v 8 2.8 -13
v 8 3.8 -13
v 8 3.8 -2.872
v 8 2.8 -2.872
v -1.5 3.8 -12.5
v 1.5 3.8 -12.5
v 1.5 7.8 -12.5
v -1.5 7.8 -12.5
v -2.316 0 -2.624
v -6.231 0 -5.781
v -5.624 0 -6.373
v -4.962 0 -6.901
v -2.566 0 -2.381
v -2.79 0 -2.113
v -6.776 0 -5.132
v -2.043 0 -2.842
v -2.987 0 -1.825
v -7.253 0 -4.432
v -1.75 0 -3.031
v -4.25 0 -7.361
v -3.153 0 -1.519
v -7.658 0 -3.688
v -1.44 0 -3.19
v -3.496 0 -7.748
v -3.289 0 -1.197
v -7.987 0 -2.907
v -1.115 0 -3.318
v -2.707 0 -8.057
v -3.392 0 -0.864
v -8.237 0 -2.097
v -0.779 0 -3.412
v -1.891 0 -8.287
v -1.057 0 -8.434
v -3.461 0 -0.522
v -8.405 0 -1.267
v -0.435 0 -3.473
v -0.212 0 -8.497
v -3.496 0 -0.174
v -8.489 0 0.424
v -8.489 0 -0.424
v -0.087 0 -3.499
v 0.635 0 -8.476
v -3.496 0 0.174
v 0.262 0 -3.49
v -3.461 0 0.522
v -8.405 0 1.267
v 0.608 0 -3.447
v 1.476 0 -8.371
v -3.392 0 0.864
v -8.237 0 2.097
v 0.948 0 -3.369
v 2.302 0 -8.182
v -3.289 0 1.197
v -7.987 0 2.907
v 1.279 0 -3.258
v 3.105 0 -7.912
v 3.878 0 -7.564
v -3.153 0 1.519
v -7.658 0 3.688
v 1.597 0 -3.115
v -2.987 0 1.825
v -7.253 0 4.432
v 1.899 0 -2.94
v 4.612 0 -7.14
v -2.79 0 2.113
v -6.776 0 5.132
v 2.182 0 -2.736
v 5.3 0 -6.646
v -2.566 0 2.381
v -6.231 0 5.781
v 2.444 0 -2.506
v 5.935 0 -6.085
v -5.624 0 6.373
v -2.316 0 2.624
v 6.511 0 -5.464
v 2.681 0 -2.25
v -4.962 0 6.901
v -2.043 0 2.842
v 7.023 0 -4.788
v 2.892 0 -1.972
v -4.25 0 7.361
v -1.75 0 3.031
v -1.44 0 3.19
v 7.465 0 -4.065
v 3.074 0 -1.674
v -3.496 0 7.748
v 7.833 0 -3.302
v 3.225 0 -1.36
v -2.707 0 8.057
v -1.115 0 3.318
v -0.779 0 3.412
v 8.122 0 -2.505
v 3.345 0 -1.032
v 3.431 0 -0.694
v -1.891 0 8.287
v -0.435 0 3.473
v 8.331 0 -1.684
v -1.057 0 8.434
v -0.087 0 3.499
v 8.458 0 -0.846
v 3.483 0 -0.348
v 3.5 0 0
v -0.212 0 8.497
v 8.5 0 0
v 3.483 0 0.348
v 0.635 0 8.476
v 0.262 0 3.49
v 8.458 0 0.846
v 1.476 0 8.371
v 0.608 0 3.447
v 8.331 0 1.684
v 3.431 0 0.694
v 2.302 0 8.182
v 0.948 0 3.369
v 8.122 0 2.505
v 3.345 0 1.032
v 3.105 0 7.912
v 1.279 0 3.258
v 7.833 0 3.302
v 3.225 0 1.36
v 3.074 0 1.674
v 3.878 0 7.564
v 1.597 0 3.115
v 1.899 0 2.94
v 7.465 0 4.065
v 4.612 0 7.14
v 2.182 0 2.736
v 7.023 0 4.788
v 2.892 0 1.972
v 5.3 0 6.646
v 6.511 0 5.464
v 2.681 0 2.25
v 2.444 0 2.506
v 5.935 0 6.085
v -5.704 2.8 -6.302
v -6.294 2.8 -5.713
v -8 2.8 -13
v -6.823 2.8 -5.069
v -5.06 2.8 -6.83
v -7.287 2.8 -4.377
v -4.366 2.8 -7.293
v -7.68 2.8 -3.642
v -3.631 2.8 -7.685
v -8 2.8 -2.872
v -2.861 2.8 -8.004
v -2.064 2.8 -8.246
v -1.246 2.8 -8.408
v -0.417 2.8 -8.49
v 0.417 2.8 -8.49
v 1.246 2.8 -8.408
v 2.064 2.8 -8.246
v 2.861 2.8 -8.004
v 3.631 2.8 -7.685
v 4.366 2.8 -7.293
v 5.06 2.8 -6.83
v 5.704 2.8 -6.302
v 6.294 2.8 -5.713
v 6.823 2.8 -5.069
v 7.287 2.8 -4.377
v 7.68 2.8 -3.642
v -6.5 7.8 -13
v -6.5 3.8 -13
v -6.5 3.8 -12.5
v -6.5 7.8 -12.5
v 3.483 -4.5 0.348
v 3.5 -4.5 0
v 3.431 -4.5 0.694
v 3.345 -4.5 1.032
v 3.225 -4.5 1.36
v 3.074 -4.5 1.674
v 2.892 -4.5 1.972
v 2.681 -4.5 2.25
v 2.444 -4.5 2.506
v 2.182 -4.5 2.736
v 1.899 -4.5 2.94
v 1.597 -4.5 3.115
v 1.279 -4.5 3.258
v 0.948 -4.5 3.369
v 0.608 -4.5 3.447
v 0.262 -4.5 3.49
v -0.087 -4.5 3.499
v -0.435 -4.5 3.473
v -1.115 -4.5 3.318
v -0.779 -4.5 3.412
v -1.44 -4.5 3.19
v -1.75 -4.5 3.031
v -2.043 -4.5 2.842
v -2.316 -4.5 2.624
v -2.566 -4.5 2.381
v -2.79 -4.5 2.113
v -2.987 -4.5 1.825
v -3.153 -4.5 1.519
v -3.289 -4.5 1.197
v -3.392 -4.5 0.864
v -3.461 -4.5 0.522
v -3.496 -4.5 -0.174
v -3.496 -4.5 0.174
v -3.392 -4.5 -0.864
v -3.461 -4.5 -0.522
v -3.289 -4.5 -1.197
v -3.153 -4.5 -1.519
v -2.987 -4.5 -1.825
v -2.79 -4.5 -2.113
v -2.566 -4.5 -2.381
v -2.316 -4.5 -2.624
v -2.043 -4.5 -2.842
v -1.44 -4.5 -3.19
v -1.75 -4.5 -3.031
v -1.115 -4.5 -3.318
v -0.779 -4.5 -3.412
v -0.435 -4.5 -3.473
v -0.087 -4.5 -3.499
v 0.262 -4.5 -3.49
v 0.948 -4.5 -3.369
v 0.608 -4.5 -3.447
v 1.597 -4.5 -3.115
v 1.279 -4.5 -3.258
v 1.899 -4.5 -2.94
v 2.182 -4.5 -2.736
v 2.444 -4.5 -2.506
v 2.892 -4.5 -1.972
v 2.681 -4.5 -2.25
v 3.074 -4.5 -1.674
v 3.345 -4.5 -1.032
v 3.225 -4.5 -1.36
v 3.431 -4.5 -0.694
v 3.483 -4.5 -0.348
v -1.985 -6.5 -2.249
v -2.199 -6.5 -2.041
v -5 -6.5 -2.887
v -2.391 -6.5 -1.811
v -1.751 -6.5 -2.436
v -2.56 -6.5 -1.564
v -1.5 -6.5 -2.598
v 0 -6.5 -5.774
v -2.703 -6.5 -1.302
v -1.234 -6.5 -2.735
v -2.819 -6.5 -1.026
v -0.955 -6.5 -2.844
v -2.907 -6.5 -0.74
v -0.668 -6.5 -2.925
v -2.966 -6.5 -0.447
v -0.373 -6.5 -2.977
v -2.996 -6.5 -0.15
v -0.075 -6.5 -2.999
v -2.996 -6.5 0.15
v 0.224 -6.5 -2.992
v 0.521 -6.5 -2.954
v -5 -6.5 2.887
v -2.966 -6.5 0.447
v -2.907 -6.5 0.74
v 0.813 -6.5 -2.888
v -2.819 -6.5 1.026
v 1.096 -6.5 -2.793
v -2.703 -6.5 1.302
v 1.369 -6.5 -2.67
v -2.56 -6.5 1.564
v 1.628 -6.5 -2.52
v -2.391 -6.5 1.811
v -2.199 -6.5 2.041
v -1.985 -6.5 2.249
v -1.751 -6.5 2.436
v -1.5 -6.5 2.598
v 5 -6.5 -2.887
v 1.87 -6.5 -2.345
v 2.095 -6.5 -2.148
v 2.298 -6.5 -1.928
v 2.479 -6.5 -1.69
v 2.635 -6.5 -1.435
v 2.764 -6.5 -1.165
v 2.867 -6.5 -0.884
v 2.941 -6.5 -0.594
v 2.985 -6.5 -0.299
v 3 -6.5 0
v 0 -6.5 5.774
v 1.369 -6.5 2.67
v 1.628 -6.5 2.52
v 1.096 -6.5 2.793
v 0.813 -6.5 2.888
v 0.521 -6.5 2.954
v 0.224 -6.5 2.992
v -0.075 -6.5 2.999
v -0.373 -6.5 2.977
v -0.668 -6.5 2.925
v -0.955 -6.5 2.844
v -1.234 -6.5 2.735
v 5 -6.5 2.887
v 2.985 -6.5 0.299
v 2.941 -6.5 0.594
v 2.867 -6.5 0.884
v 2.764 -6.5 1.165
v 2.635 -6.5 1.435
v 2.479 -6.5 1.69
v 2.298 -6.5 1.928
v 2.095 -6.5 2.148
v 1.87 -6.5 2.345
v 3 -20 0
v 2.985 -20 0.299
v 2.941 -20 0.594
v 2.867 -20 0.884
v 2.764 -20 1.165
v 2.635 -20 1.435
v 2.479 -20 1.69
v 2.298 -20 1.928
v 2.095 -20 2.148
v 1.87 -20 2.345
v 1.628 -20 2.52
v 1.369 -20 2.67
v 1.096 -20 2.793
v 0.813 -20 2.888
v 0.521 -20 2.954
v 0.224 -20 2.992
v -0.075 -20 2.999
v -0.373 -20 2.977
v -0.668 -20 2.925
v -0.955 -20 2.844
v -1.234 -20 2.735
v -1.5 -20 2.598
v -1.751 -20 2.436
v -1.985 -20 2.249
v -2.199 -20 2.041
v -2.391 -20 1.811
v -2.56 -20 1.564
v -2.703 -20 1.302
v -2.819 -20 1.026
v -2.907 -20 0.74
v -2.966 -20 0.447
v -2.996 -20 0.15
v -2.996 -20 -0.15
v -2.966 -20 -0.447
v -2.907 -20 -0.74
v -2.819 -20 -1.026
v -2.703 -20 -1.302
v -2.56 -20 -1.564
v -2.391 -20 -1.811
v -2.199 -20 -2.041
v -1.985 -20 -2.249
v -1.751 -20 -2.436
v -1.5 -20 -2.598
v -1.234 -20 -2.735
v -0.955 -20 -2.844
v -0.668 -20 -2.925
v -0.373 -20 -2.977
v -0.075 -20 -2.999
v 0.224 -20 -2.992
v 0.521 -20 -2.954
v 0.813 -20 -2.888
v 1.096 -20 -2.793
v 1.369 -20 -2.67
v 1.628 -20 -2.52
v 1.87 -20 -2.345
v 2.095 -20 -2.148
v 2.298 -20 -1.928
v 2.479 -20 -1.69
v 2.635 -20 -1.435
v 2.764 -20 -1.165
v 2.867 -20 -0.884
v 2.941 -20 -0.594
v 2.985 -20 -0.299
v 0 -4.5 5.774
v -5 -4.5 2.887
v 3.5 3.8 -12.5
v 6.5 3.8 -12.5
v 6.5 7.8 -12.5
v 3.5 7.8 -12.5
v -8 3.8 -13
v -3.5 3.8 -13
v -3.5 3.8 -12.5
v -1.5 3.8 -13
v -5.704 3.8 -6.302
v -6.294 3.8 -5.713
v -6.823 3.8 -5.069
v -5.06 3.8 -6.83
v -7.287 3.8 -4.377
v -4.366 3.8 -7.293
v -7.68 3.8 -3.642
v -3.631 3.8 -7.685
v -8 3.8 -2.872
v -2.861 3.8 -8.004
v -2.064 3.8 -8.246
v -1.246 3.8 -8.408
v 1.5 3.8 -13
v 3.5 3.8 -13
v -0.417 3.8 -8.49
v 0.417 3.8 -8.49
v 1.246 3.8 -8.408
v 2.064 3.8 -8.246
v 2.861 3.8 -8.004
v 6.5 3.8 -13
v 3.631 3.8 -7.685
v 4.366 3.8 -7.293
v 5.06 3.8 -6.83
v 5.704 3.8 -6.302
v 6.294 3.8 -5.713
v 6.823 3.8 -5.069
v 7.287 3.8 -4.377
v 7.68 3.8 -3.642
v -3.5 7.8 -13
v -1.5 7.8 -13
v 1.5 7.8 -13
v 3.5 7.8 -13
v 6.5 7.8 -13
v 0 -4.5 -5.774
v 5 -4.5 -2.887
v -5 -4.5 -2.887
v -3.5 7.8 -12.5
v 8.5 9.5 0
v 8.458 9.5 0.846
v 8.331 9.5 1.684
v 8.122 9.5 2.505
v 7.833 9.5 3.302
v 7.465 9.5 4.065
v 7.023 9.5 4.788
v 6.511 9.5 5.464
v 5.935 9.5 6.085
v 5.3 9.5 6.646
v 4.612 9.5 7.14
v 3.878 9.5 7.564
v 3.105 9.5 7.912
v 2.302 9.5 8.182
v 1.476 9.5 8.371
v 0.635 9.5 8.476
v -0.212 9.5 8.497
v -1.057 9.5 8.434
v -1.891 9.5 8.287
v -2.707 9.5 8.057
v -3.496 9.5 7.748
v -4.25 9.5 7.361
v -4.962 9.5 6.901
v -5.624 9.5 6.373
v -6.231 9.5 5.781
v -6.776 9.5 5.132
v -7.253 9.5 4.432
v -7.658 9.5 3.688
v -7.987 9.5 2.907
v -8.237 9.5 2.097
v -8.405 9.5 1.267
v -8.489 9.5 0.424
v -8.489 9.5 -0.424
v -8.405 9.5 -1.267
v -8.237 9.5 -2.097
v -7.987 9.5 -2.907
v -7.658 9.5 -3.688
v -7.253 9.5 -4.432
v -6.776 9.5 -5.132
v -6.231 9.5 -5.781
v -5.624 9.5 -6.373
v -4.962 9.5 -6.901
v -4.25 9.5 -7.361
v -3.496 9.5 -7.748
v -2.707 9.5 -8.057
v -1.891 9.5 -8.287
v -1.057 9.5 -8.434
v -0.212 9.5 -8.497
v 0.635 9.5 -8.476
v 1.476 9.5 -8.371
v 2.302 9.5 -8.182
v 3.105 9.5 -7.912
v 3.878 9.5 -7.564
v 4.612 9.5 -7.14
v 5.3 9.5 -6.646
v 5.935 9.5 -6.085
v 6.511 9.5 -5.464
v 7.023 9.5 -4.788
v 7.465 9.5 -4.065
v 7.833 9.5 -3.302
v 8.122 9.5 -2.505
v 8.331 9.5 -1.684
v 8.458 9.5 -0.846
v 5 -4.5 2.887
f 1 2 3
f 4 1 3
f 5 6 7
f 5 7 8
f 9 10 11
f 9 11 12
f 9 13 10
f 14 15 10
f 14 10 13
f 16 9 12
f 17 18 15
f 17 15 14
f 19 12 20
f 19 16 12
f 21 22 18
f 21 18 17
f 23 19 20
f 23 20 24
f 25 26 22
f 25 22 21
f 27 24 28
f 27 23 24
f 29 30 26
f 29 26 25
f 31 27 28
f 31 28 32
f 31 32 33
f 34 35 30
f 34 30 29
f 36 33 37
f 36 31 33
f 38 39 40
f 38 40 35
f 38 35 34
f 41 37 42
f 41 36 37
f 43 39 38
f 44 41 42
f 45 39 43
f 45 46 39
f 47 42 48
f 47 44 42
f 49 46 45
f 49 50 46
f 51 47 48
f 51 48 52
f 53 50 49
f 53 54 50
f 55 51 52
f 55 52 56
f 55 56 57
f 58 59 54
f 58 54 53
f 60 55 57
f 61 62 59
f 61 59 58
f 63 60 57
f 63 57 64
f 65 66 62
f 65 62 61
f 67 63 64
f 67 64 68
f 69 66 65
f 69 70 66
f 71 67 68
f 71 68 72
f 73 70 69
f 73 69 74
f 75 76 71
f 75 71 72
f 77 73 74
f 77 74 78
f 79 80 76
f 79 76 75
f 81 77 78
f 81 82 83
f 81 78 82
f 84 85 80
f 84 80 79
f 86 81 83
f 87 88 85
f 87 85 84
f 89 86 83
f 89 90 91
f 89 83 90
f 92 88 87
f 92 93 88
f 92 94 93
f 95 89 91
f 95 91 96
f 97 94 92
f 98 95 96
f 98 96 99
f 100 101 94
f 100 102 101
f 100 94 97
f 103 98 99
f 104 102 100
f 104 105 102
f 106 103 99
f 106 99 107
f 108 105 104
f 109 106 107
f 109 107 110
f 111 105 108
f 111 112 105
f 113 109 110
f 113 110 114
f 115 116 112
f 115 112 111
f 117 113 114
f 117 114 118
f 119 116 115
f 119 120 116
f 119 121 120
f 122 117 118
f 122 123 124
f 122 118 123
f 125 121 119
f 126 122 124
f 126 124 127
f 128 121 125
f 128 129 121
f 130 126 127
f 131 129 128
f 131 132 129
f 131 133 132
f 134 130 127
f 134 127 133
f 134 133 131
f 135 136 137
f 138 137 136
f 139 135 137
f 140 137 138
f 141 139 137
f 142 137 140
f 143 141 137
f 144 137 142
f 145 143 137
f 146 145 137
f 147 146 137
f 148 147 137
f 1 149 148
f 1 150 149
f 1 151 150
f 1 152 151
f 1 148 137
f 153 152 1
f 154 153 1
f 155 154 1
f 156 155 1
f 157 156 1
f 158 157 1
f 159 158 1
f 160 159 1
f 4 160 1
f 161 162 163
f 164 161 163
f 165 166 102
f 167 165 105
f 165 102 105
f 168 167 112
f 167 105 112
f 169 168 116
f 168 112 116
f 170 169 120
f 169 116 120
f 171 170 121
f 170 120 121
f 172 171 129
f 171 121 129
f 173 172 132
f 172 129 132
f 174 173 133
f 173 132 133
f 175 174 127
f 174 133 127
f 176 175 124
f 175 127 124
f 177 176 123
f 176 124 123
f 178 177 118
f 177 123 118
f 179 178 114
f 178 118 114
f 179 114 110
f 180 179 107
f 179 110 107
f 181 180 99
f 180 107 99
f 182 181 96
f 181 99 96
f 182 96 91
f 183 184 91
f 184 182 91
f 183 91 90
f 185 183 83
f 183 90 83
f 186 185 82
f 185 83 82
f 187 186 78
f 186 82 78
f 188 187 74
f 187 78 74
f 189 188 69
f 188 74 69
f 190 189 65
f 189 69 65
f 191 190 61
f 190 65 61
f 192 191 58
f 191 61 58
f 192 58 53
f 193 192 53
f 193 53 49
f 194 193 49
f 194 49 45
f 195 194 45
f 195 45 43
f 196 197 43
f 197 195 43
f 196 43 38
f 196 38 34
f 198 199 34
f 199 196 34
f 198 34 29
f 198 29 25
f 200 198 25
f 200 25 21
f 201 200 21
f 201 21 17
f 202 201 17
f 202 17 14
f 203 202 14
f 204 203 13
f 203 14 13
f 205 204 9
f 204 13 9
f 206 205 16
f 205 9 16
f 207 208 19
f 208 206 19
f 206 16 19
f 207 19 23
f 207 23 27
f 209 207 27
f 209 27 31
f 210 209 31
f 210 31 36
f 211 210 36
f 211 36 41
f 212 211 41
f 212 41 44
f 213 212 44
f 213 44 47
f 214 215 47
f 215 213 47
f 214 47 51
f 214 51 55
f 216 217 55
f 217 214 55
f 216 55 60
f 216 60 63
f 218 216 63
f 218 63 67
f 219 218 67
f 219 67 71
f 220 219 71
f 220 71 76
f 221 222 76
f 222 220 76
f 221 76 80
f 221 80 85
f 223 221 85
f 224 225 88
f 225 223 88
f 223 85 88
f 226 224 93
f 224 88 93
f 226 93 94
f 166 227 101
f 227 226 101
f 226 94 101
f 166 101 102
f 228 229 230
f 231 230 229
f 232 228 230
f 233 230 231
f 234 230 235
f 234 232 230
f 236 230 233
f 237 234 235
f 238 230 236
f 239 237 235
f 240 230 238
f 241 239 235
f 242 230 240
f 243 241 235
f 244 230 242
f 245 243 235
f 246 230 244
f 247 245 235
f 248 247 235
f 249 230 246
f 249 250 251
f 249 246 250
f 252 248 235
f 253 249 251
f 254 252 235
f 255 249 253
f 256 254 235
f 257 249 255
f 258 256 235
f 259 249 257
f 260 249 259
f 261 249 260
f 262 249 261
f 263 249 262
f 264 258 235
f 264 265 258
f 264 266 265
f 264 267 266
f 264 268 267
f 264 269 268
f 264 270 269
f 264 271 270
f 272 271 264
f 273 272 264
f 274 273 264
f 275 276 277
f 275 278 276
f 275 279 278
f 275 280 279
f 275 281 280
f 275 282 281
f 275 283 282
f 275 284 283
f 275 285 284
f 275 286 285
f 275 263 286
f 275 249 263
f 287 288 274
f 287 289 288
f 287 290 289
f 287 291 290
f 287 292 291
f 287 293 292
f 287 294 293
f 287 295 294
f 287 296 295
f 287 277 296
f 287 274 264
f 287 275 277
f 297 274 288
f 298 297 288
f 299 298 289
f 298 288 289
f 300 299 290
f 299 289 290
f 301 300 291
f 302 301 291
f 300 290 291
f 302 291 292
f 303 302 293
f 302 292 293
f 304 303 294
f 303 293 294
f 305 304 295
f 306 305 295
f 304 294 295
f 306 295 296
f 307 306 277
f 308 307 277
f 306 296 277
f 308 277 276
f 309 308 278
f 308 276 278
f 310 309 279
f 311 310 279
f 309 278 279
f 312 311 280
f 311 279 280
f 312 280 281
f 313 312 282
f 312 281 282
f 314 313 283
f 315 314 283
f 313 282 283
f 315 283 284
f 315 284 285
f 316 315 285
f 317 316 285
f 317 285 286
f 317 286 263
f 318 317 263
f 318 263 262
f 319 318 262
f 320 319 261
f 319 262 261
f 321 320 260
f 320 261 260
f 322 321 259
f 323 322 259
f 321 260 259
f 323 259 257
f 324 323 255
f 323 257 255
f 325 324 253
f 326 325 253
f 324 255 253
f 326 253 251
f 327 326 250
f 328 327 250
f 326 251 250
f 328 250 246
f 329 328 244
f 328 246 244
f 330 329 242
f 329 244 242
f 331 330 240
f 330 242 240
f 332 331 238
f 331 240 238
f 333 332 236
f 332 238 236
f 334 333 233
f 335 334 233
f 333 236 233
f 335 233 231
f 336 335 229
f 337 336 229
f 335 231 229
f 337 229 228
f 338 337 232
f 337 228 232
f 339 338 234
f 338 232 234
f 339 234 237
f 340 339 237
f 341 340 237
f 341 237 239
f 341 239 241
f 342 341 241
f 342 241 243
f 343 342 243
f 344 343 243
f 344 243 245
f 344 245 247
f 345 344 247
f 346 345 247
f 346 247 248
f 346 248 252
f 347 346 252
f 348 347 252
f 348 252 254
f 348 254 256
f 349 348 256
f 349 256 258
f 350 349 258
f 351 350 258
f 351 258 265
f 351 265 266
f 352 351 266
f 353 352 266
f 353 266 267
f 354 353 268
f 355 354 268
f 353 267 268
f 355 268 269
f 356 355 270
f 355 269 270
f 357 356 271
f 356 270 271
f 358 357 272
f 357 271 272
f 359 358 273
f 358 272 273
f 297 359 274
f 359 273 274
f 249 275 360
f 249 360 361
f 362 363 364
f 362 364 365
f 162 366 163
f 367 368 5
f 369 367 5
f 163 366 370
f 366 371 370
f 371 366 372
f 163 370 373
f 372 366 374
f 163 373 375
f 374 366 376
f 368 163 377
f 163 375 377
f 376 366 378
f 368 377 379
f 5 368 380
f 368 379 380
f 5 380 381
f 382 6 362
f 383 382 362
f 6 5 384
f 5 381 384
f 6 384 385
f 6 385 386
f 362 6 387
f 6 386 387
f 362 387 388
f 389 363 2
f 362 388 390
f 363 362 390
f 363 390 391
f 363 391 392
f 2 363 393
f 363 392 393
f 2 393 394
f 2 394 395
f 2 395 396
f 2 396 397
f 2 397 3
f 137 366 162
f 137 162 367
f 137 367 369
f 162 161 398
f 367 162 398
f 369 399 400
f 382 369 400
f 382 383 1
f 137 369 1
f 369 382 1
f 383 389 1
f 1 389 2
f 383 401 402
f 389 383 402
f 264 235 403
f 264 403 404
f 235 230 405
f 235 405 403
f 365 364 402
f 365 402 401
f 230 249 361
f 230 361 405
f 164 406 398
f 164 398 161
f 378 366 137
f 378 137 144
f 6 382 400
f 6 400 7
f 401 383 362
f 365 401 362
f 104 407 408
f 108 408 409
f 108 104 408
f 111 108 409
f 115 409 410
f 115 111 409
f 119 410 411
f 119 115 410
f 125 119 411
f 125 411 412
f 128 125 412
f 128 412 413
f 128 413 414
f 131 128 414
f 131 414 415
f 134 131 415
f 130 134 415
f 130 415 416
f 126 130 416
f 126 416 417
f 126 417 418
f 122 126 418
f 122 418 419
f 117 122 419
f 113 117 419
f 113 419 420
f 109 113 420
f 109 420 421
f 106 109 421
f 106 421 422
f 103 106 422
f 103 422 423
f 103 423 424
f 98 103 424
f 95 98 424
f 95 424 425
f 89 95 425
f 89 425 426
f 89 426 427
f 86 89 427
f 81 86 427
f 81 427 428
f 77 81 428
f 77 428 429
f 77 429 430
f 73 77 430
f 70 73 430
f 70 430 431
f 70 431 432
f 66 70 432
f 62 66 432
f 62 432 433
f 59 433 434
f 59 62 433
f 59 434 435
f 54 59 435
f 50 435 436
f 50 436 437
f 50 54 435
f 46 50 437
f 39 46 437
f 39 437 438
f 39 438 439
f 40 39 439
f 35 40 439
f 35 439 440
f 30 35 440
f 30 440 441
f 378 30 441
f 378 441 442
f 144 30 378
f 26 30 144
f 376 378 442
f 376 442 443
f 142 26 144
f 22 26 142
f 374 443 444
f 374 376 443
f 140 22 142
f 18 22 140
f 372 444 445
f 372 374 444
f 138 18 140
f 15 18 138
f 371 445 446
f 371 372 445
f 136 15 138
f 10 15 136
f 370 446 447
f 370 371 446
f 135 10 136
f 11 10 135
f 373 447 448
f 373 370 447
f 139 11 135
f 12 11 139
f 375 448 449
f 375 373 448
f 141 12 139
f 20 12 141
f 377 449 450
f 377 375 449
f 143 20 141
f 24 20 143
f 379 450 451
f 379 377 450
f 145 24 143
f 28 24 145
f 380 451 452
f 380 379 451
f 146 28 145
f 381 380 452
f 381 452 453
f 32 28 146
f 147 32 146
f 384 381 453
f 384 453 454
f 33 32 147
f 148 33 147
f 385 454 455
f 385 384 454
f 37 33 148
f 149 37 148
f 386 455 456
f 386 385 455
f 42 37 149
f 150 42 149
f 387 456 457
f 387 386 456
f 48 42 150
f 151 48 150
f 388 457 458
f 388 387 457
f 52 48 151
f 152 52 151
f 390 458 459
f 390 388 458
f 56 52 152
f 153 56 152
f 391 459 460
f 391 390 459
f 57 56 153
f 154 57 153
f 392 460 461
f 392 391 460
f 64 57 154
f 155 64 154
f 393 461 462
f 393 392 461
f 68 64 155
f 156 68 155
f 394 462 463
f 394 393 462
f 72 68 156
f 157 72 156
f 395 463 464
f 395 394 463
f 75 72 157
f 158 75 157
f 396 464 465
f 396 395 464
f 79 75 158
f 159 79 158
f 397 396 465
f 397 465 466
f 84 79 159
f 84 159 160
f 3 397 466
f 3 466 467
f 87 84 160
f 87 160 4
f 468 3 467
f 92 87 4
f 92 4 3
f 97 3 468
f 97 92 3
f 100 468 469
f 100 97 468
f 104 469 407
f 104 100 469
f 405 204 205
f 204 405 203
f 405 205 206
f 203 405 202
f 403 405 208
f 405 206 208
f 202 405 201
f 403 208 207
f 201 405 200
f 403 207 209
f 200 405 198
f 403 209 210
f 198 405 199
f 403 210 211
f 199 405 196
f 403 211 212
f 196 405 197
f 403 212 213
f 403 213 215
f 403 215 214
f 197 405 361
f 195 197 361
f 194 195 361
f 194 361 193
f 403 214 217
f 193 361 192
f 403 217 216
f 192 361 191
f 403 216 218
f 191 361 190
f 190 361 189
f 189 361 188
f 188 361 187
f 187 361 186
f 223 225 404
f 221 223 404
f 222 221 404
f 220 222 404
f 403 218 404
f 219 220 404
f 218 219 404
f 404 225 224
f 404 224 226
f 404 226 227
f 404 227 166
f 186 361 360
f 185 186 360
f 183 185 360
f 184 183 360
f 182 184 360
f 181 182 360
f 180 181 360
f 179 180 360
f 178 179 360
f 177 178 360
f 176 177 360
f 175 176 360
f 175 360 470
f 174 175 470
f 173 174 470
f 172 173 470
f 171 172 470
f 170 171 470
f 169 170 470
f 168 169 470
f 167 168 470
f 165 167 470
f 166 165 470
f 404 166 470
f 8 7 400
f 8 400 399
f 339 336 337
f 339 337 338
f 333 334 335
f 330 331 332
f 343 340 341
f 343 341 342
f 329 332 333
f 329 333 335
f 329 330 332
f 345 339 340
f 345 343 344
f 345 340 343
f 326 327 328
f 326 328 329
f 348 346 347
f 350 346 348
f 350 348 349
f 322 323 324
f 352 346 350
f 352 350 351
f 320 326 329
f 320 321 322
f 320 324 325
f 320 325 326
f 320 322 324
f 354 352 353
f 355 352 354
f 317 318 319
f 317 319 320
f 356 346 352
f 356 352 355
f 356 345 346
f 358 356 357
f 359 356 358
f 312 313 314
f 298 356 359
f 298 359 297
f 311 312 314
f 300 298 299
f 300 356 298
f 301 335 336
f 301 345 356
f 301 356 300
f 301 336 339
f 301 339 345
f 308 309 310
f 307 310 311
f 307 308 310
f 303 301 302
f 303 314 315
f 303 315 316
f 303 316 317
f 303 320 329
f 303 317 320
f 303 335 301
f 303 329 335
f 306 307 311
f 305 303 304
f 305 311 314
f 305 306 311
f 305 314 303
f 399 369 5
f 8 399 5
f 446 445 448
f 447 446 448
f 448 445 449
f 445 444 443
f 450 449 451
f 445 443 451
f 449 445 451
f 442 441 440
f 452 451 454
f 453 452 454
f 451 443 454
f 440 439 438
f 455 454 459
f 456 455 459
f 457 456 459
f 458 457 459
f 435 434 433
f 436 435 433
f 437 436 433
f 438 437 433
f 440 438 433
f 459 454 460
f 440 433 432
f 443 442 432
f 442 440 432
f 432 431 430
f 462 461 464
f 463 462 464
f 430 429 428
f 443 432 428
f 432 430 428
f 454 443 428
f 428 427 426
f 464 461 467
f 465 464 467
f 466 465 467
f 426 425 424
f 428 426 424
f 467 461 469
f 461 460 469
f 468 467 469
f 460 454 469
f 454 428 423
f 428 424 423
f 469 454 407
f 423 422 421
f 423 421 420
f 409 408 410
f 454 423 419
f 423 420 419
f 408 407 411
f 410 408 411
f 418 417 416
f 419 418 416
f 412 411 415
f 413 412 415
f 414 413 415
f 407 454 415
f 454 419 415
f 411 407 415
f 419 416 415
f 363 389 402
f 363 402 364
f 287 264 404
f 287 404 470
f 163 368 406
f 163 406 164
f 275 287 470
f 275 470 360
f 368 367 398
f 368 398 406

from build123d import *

# Parameters (mm, degrees)
F0_R      = 8.5
F1_DEPTH  = 9.5
F3_W      = 16
F3_H      = 14
F4_DEPTH  = 1
F5_W      = 3
F5_H      = 0.5
F6_DEPTH  = 4
F7_R      = 3.5
F8_DEPTH  = 6.5
F9_R      = 3
F10_DEPTH = 13.5
F12_DEPTH = 2


with BuildPart() as f1:
    # F0 (on Front) → F1 (new body)
    with BuildSketch(Plane.XZ):
        Circle(F0_R)
    extrude(amount=-F1_DEPTH)

    # F3 (on offset) → F4 (join)
    with BuildSketch(Plane.XZ.offset(-3.8)):
        with Locations((0, -6)):
            Rectangle(F3_W, F3_H)
    extrude(amount=F4_DEPTH)

    # F5 (on face) → F6 (join)
    with BuildSketch(Plane(origin=(0, 3.8, 0), x_dir=(-1, 0, 0), z_dir=(0, 1, 0))):
        with Locations((0, -12.75)):
            Rectangle(F5_W, F5_H)
        with Locations((-5, -12.75)):
            Rectangle(F5_W, F5_H)
        with Locations((5, -12.75)):
            Rectangle(F5_W, F5_H)
    extrude(amount=F6_DEPTH)

    # F7 (on face) → F8 (join)
    with BuildSketch(Plane.XZ):
        Circle(F7_R)
    extrude(amount=F8_DEPTH)

    # F9 (on face) → F10 (join)
    with BuildSketch(Plane.XZ.offset(6.5)):
        Circle(F9_R)
    extrude(amount=F10_DEPTH)

    # F11 (on face) → F12 (join)
    with BuildSketch(Plane.XZ.offset(6.5)):
        Polygon((5, -2.886751), (5, 2.886751), (0, 5.773503), (-5, 2.886751), (-5, -2.886751), (0, -5.773503), align=None)
    extrude(amount=-F12_DEPTH)


solid = f1.part
